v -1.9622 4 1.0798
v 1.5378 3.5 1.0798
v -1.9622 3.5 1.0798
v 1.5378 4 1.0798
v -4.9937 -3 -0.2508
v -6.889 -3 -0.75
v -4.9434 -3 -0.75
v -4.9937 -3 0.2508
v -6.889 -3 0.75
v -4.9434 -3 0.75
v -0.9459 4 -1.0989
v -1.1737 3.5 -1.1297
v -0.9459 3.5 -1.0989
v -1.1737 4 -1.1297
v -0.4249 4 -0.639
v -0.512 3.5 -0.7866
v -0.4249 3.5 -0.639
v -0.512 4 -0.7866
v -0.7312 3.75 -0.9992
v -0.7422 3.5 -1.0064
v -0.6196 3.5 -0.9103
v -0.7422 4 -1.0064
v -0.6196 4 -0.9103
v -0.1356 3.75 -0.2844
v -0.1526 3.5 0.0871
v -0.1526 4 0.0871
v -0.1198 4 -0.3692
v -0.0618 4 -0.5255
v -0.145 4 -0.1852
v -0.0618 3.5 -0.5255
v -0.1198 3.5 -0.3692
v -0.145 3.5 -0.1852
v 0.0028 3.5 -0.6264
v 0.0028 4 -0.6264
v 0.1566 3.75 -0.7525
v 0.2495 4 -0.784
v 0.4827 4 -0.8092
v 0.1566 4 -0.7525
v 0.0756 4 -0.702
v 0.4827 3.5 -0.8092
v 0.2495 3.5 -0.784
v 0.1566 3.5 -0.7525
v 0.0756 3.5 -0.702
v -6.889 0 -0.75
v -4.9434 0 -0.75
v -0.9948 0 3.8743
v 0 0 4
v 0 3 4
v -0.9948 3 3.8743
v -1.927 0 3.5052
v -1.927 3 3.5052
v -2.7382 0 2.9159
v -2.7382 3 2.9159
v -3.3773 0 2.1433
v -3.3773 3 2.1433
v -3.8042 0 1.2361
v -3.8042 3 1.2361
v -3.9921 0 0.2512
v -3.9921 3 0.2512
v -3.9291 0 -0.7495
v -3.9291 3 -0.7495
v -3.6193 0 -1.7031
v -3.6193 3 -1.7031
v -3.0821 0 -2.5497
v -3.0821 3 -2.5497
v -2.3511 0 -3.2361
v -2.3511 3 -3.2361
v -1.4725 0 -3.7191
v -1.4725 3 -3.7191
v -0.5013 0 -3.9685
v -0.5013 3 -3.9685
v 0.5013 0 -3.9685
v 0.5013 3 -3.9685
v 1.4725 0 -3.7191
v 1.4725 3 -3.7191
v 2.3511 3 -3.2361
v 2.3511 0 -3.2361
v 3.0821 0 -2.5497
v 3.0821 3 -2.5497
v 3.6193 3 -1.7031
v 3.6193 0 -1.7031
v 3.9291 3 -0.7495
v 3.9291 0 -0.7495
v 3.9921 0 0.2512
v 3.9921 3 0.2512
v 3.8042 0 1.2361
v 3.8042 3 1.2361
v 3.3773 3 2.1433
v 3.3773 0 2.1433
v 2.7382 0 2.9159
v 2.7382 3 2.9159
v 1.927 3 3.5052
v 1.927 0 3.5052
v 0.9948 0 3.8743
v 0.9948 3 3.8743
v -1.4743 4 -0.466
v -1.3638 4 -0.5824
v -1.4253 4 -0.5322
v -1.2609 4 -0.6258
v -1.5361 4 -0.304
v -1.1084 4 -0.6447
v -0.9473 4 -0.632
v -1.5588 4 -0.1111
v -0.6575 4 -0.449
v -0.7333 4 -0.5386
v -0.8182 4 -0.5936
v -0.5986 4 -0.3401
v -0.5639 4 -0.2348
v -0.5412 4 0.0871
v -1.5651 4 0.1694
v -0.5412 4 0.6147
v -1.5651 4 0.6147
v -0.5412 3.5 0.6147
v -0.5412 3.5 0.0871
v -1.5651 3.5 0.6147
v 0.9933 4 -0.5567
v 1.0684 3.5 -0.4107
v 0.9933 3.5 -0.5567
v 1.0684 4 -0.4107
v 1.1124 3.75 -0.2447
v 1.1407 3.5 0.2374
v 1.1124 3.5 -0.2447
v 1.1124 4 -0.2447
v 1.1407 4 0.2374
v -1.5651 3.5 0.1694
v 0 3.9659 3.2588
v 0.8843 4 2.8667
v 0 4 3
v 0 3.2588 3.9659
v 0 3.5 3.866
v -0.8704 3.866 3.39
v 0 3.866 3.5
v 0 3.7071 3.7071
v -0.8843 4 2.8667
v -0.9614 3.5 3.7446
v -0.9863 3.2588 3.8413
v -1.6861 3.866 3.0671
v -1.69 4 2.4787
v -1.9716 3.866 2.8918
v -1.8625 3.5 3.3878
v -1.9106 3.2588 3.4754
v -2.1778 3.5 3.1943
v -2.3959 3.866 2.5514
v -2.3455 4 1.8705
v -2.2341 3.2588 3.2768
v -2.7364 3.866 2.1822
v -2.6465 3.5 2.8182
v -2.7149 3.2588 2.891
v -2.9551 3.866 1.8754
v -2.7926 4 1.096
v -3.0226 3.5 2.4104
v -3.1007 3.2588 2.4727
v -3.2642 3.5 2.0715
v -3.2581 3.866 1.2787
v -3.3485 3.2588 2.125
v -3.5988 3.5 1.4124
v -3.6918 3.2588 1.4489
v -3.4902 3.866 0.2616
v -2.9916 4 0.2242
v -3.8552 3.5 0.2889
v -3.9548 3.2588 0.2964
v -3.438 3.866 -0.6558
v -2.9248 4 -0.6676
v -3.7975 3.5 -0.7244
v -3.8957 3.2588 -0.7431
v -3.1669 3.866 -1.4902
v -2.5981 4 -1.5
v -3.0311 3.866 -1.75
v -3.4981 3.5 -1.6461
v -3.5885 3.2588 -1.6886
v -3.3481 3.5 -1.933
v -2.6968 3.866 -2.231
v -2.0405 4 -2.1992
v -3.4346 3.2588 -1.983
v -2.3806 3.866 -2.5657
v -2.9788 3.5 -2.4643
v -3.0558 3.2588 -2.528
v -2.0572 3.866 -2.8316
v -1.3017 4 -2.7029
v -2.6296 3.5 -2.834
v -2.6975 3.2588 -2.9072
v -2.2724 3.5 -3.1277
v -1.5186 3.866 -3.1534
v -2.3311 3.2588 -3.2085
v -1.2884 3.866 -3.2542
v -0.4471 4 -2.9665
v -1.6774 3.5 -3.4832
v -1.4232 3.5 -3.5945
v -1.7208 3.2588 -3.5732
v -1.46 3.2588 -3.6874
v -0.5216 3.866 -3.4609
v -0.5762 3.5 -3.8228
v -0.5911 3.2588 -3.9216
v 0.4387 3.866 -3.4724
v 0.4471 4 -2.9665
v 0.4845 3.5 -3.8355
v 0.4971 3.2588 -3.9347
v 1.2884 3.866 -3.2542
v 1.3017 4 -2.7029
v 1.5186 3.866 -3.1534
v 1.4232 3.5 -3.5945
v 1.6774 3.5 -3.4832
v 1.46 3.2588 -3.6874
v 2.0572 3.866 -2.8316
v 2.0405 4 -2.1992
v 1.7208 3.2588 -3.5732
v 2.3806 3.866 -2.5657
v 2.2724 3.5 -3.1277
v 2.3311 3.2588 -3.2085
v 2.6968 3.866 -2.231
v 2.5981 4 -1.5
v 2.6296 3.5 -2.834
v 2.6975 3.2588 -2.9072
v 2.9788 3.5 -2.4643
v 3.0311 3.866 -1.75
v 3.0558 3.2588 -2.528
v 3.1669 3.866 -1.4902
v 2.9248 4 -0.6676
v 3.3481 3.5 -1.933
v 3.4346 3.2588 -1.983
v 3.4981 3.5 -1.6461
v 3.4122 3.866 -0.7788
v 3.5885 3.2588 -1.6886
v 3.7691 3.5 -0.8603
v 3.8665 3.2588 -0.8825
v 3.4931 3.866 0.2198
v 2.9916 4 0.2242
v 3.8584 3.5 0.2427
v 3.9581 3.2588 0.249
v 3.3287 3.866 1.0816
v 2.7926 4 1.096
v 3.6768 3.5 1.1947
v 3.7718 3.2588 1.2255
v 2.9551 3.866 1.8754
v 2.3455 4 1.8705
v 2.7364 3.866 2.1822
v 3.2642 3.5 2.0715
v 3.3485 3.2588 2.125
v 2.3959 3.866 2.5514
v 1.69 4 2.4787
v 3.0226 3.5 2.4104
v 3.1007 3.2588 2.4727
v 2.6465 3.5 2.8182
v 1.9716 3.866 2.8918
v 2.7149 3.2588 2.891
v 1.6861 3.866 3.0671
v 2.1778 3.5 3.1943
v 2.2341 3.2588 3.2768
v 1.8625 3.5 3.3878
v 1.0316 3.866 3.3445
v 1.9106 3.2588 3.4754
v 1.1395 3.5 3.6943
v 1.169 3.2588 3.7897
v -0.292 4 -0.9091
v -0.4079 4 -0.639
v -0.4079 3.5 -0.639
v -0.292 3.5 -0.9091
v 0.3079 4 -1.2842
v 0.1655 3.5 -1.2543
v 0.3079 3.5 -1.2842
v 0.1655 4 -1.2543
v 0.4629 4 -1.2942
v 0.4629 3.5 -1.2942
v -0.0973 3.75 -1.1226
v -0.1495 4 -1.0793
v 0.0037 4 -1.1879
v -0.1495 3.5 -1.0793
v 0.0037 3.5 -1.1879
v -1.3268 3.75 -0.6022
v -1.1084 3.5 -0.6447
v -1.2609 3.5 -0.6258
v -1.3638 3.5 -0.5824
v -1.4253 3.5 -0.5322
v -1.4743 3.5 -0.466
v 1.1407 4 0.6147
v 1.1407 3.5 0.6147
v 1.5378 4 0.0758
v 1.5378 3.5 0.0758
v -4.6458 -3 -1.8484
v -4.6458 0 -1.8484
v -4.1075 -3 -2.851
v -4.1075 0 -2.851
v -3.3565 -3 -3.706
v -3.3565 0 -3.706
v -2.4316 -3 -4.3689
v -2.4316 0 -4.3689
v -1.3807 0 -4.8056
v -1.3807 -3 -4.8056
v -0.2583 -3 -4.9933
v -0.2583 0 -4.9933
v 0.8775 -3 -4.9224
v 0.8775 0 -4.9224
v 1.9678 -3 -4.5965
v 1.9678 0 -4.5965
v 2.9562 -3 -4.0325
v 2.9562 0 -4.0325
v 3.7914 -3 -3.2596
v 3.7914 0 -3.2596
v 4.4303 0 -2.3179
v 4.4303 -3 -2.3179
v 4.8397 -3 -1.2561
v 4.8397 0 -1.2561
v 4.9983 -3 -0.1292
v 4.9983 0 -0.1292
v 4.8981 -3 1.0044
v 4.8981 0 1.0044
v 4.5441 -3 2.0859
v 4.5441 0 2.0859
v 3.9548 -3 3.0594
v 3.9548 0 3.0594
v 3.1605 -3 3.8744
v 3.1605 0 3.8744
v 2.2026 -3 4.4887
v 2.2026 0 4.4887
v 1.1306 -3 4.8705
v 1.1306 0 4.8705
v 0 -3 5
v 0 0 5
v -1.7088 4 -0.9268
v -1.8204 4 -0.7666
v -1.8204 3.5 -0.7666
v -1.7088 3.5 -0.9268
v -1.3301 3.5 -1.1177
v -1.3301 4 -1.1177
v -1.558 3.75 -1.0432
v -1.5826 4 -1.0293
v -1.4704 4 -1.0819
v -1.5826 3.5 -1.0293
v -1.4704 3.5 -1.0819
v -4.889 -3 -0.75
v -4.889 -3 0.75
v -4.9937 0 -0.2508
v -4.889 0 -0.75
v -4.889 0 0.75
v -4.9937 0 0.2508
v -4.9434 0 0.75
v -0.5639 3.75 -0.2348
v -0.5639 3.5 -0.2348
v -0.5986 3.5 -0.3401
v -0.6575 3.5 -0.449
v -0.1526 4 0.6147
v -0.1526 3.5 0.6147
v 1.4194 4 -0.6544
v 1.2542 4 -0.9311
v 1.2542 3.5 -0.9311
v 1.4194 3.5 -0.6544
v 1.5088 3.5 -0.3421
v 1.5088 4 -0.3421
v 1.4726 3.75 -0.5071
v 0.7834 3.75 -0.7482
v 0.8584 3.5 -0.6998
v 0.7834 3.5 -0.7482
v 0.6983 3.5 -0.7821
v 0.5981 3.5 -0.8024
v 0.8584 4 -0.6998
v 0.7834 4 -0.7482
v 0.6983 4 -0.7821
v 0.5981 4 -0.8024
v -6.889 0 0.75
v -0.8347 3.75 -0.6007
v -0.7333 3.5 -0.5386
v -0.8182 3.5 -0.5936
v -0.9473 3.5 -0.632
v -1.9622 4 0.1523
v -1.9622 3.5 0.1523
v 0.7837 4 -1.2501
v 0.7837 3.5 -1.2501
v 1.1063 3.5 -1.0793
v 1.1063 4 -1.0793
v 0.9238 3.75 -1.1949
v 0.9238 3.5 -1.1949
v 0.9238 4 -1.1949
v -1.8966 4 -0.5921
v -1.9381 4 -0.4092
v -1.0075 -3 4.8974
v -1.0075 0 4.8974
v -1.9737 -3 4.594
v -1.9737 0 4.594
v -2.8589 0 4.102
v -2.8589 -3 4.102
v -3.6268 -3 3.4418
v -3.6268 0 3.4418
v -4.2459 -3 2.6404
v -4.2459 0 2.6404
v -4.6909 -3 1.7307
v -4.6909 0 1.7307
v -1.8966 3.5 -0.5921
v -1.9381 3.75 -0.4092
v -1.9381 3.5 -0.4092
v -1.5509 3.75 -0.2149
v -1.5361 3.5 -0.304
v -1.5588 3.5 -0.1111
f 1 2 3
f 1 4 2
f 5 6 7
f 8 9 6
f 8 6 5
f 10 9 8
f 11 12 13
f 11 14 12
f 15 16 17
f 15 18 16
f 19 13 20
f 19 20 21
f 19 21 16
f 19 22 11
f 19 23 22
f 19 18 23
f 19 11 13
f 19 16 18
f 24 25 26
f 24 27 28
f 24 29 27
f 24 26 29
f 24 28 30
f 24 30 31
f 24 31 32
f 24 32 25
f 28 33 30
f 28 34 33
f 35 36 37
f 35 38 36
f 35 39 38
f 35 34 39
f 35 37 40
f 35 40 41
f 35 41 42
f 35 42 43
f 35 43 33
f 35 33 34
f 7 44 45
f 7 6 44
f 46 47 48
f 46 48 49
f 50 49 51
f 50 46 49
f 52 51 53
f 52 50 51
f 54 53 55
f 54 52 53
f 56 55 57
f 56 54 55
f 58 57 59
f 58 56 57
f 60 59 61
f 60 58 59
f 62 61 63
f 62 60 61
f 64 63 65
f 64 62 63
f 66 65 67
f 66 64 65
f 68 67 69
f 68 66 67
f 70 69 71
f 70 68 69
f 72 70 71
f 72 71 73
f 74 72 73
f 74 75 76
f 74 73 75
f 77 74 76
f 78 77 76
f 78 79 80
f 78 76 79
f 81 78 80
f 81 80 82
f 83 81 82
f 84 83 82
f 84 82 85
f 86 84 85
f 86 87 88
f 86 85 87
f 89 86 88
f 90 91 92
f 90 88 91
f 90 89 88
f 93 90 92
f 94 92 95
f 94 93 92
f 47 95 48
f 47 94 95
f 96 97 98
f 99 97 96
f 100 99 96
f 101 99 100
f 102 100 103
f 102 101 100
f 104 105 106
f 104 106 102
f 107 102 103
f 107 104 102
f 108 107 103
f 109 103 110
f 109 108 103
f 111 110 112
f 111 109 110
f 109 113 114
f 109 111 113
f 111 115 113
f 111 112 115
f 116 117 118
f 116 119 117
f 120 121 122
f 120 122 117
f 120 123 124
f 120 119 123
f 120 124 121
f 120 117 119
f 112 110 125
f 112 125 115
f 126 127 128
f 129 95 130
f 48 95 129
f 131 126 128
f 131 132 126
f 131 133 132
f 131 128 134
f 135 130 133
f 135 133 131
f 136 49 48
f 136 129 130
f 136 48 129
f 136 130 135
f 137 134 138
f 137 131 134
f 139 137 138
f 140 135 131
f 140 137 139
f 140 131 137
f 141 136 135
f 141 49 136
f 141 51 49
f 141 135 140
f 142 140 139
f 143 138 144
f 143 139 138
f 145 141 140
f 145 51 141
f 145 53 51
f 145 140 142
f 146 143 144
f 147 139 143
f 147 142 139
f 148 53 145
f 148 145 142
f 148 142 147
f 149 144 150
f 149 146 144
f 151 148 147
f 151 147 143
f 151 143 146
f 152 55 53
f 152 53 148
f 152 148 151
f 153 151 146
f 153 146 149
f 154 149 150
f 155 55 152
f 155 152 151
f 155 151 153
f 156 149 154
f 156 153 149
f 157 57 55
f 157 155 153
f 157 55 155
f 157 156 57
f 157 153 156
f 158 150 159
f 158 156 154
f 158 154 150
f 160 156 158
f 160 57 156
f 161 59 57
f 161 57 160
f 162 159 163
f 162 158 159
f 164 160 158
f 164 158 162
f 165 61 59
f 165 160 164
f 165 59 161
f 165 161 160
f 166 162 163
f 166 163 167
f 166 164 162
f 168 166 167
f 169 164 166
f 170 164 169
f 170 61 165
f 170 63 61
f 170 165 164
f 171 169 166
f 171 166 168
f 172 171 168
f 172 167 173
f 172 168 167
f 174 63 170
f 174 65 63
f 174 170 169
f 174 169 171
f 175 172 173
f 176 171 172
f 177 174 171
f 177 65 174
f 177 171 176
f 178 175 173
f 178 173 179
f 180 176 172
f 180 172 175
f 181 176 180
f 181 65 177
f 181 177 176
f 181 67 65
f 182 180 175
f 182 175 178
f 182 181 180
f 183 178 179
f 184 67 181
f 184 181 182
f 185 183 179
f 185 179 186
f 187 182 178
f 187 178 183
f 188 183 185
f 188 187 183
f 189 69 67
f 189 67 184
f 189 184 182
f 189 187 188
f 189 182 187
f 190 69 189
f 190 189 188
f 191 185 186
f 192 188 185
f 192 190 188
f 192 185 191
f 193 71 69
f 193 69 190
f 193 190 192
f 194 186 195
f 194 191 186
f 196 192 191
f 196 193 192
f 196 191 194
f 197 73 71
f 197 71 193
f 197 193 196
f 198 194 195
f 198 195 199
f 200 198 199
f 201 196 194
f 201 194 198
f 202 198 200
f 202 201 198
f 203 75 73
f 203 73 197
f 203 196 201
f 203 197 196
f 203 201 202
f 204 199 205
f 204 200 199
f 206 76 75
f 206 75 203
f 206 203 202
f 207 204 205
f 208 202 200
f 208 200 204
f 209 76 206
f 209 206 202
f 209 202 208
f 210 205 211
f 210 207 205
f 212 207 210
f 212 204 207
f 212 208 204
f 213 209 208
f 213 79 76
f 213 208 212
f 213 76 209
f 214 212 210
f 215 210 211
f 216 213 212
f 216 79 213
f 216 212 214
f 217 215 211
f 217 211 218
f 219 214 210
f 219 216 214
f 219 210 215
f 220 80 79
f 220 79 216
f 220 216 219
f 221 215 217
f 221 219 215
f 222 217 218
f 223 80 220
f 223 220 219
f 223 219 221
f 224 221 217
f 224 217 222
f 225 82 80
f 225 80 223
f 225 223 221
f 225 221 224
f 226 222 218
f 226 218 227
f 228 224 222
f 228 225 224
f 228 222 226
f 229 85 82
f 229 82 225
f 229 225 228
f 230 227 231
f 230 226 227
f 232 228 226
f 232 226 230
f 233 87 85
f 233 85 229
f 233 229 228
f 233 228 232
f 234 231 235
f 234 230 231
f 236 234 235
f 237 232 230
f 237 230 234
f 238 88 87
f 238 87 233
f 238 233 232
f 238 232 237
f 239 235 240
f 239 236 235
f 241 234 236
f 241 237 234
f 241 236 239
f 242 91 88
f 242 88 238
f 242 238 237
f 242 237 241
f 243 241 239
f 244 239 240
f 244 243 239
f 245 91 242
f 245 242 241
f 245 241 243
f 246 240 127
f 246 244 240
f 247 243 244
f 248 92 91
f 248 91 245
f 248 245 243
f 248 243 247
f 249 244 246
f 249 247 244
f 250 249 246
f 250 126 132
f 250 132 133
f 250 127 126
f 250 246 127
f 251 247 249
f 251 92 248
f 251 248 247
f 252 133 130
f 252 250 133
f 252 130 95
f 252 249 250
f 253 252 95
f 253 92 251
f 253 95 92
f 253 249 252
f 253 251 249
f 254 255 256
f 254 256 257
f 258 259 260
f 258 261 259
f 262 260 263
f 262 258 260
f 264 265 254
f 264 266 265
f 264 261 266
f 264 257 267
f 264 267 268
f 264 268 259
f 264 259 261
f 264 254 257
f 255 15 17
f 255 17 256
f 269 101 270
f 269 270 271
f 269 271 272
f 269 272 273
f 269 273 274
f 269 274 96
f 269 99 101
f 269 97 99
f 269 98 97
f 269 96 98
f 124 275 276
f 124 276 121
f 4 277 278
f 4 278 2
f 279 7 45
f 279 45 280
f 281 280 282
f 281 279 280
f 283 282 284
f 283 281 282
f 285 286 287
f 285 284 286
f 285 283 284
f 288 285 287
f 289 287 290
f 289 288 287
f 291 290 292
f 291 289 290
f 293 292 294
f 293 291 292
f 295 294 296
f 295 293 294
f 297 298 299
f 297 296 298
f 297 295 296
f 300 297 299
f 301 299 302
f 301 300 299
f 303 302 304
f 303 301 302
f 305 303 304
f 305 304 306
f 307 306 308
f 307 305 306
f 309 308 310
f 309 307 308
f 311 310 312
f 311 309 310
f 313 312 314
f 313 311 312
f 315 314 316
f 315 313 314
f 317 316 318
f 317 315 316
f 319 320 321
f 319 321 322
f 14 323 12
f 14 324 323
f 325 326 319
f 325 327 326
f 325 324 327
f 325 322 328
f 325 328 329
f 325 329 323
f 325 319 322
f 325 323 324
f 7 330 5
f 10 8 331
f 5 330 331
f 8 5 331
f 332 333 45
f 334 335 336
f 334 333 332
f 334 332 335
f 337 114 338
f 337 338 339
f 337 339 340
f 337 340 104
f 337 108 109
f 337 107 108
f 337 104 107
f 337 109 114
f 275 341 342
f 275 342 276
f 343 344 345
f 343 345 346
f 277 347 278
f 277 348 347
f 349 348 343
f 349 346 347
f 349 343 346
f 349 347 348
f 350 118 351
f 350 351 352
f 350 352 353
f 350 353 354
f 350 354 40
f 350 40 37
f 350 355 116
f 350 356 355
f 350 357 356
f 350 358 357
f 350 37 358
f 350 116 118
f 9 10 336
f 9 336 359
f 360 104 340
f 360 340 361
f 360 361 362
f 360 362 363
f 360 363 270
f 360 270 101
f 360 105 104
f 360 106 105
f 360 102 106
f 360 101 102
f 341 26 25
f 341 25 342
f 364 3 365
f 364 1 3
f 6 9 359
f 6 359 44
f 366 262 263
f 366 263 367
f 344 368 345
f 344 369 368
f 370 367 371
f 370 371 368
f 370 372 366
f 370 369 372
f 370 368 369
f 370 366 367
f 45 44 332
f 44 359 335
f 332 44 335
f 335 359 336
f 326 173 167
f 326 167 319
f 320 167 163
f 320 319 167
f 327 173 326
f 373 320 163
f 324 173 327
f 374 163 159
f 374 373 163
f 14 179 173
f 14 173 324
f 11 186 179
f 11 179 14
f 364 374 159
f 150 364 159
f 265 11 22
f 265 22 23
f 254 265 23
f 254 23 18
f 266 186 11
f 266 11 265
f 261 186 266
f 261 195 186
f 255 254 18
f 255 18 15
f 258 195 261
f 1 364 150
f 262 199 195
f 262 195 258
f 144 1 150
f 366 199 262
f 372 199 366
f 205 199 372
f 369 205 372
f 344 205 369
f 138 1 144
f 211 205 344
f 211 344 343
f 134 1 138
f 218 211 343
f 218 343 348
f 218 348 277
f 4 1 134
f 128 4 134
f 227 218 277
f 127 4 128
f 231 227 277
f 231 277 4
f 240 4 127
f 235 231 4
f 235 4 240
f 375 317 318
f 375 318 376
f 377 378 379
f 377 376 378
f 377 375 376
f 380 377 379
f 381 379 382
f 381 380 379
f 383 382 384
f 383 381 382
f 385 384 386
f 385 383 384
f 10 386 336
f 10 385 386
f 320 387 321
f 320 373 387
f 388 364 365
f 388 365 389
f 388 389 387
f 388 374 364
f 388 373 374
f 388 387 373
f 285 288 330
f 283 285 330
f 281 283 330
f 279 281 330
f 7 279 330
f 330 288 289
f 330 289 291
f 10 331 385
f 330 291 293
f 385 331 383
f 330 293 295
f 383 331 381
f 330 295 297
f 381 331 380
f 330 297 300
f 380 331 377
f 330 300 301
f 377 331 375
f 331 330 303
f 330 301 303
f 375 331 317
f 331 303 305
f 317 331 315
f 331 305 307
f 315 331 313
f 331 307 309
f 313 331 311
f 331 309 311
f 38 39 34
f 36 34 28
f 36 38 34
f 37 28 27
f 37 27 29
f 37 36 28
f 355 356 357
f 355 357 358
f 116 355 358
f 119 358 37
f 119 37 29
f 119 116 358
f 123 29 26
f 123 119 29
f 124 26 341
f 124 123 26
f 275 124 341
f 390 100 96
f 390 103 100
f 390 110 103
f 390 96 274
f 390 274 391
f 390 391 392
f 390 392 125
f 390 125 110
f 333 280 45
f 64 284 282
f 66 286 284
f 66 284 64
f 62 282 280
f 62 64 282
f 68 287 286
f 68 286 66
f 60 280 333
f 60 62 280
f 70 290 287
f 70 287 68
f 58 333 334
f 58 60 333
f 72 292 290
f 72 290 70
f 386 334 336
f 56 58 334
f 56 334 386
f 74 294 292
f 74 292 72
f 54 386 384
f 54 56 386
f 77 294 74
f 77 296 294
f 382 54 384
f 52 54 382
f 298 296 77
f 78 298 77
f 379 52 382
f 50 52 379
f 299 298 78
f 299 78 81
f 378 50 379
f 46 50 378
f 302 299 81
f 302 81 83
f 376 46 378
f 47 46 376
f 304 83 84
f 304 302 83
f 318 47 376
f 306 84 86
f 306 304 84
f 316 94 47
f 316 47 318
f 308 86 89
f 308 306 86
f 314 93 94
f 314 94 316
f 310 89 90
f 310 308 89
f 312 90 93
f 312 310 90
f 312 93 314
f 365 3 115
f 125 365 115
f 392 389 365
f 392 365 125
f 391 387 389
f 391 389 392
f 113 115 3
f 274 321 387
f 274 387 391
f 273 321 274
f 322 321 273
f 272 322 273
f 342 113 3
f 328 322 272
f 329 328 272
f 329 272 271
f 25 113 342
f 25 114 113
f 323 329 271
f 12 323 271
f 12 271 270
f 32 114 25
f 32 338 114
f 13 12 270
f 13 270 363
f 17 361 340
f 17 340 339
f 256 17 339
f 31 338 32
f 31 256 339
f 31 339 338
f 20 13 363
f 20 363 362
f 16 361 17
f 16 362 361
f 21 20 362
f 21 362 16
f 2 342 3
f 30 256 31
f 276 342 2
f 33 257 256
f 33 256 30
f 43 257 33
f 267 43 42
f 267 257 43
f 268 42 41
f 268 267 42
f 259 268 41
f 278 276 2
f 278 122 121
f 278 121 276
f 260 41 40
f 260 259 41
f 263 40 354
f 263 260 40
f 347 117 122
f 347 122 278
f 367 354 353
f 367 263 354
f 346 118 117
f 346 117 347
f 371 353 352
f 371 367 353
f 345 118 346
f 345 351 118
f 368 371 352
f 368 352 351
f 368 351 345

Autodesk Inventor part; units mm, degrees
ref_plane "YZ Plane" through (0, 0, 0) normal (1, 0, 0) x (0, 1, 0)
ref_plane "XZ Plane" through (0, 0, 0) normal (0, 1, 0) x (-1, 0, 0)
ref_plane "XY Plane" through (0, 0, 0) normal (0, 0, 1) x (1, 0, 0)
sketch "Skizze1" plane through (0, 0, 0) normal (1, 0, 0) x (0, 1, 0)
  line L0 (4, 0) -> (4, 3)
  arc A0 (4, 3) -> (3, 4) centre (3, 3) ccw
  line L1 (3, 4) -> (0, 4)
  line L2 (0, 4) -> (0, 5)
  line L3 (0, 5) -> (-3, 5)
  line L4 (-3, 5) -> (-3, 2)
  line L5 (0, 0) -> (4, 0)
  line L6 (-3, 2) -> (-3, 0)
  line L7 (-3, 0) -> (0, 0)
  point P0 (0, 2)
  dimension "d0" = 2
  dimension "d1" = 4
  dimension "d2" = 3
  dimension "d3" = 5
  dimension "d4" = 3
  dimension "d5" = 1
  dimension "d6" = 1
revolve "Umdrehung1" add sketch "Skizze1" angle 360 about axis through (0, 0, 0) along (0, 1, 0)
sketch "Skizze2" plane through (0, 4, 0) normal (0, 1, 0) x (1, 0, 0)
  line L0 (-1.9622, -1.4344) -> (-1.9622, 1.4984) construction
  line L1 (-1.9622, 1.4984) -> (1.5378, 1.4984) construction
  line L2 (1.5378, 1.4984) -> (1.5378, -1.4344) construction
  line L3 (1.5378, -1.4344) -> (-1.9622, -1.4344) construction
  spline S0 degree 2 poles (0.4629, 1.2942) (0.7238, 1.2942) (1.1237, 1.0956) (1.2542, 0.9311) knots 0 0 0 1 2 2 2
  spline S1 degree 2 poles (1.2542, 0.9311) (1.4074, 0.7326) (1.5378, 0.2816) (1.5378, -0.0758) knots 0 0 0 1 2 2 2
  line L4 (1.5378, -0.0758) -> (1.5378, -1.0798)
  line L5 (1.5378, -1.0798) -> (-1.9622, -1.0798)
  line L6 (-1.9622, -1.0798) -> (-1.9622, -0.1523)
  spline S2 degree 2 poles (-1.9622, -0.1523) (-1.9622, 0.222) (-1.914, 0.5964) (-1.8204, 0.7666) knots 0 0 0 1 2 2 2
  spline S3 degree 2 poles (-1.8204, 0.7666) (-1.7211, 0.9566) (-1.3949, 1.1297) (-1.1737, 1.1297) knots 0 0 0 1 2 2 2
  spline S4 degree 2 poles (-1.1737, 1.1297) (-0.9269, 1.1297) (-0.5355, 0.8687) (-0.4249, 0.639) knots 0 0 0 1 2 2 2
  line L7 (-0.4249, 0.639) -> (-0.4079, 0.639)
  spline S5 degree 2 poles (-0.4079, 0.639) (-0.3228, 0.951) (0.1282, 1.2942) (0.4629, 1.2942) knots 0 0 0 1 2 2 2
  spline S6 degree 2 poles (0.4827, 0.8092) (0.2842, 0.8092) (0.0289, 0.6957) (-0.0618, 0.5255) knots 0 0 0 1 2 2 2
  spline S7 degree 2 poles (-0.0618, 0.5255) (-0.1186, 0.4149) (-0.1526, 0.154) (-0.1526, -0.0871) knots 0 0 0 1 2 2 2
  line L8 (-0.1526, -0.0871) -> (-0.1526, -0.6147)
  line L9 (-0.1526, -0.6147) -> (1.1407, -0.6147)
  line L10 (1.1407, -0.6147) -> (1.1407, -0.2374)
  spline S8 degree 2 poles (1.1407, -0.2374) (1.1407, 0.0689) (1.084, 0.4206) (0.9933, 0.5567) knots 0 0 0 1 2 2 2
  spline S9 degree 2 poles (0.9933, 0.5567) (0.8997, 0.6872) (0.6671, 0.8092) (0.4827, 0.8092) knots 0 0 0 1 2 2 2
  spline S10 degree 2 poles (-1.1084, 0.6447) (-1.2332, 0.6447) (-1.4204, 0.5596) (-1.4743, 0.466) knots 0 0 0 1 2 2 2
  spline S11 degree 2 poles (-1.4743, 0.466) (-1.5367, 0.3525) (-1.5651, 0.0774) (-1.5651, -0.1694) knots 0 0 0 1 2 2 2
  line L11 (-1.5651, -0.1694) -> (-1.5651, -0.6147)
  line L12 (-1.5651, -0.6147) -> (-0.5412, -0.6147)
  line L13 (-0.5412, -0.6147) -> (-0.5412, -0.0871)
  spline S12 degree 2 poles (-0.5412, -0.0871) (-0.5412, 0.1313) (-0.5866, 0.3383) (-0.6575, 0.449) knots 0 0 0 1 2 2 2
  spline S13 degree 2 poles (-0.6575, 0.449) (-0.7255, 0.5567) (-0.9439, 0.6447) (-1.1084, 0.6447) knots 0 0 0 1 2 2 2
  point P0 (0, 0)
extrude "Extrusion1" cut sketch "Skizze2" against normal blind 0.5
sketch "Skizze4" plane through (0, -3, 0) normal (0, -1, 0) x (1, 0, 0)
  line L0 (-4.889, 0.75) -> (-6.889, 0.75)
  line L1 (-6.889, 0.75) -> (-6.889, -0.75)
  line L2 (-6.889, -0.75) -> (-4.889, -0.75)
  line L3 (-4.889, -0.75) -> (-4.889, 0.75)
  point P0 (0, 0)
  dimension "d15" = 1.5
  dimension "d16" = 2
  dimension "d17" = 0.75
extrude "Extrusion3" add sketch "Skizze4" against normal blind 3
properties part number "ButtonB_neu"
